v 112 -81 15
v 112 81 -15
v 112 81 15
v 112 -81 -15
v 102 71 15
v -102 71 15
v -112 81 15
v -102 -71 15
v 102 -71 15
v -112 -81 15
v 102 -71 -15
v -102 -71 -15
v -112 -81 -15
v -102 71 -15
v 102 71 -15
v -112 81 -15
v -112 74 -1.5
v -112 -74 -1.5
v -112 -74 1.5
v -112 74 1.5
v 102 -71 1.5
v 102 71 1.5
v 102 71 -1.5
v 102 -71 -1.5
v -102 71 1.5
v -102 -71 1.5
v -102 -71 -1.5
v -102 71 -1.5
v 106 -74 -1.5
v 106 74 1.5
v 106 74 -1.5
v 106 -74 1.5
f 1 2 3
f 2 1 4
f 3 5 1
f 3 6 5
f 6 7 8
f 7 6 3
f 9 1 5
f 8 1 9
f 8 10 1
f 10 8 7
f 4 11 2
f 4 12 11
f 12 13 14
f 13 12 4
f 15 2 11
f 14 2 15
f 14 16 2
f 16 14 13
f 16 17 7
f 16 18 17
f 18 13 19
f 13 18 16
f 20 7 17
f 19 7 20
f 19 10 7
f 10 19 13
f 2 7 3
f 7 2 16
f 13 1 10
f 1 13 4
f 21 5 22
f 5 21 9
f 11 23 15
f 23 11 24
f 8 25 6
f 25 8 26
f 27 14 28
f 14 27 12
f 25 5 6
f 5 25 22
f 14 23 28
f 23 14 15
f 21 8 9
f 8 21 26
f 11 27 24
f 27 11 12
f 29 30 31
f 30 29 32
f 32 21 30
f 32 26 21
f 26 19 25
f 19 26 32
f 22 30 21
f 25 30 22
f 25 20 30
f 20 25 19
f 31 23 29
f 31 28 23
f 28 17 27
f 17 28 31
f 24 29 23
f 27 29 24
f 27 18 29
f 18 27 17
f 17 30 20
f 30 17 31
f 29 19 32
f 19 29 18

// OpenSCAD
  //Dimension 
  
  length = 224;
  
  width = 162;
  
  depth = 30;
  
  frame = 10 //[5:50]
  ;
  
  picture = 3;
  
  deepening = 3
  // You can adjust the depth of your picture (0 = mid)
  ;
  picture_height= 0 //[-30:+30]
  ;
  
  // Add a hanger to mount the frame on a wall
  hanger = "no"; // [yes,no]
  ;
  
  
  difference(){
  
//create outer frame 
  cube([length, width, depth], true);
      
//difference inner frame
  cube([length-2*frame, width-2*frame, depth], true);

//difference picture
 translate([-(frame-2*deepening),0,depth*picture_height/100]) 
  cube([length-(frame-deepening*2), width-2*frame+2*deepening, picture], true);
} 


if (hanger=="yes"){

difference () {   

translate([-length/2+frame+4,0,-depth/2+1])
cylinder(  2, d=14, center=true);

translate([-length/2+frame+4,0,-depth/2+1])
cylinder(  2, d=7, center=true);
}    
}
      
       


         
  
